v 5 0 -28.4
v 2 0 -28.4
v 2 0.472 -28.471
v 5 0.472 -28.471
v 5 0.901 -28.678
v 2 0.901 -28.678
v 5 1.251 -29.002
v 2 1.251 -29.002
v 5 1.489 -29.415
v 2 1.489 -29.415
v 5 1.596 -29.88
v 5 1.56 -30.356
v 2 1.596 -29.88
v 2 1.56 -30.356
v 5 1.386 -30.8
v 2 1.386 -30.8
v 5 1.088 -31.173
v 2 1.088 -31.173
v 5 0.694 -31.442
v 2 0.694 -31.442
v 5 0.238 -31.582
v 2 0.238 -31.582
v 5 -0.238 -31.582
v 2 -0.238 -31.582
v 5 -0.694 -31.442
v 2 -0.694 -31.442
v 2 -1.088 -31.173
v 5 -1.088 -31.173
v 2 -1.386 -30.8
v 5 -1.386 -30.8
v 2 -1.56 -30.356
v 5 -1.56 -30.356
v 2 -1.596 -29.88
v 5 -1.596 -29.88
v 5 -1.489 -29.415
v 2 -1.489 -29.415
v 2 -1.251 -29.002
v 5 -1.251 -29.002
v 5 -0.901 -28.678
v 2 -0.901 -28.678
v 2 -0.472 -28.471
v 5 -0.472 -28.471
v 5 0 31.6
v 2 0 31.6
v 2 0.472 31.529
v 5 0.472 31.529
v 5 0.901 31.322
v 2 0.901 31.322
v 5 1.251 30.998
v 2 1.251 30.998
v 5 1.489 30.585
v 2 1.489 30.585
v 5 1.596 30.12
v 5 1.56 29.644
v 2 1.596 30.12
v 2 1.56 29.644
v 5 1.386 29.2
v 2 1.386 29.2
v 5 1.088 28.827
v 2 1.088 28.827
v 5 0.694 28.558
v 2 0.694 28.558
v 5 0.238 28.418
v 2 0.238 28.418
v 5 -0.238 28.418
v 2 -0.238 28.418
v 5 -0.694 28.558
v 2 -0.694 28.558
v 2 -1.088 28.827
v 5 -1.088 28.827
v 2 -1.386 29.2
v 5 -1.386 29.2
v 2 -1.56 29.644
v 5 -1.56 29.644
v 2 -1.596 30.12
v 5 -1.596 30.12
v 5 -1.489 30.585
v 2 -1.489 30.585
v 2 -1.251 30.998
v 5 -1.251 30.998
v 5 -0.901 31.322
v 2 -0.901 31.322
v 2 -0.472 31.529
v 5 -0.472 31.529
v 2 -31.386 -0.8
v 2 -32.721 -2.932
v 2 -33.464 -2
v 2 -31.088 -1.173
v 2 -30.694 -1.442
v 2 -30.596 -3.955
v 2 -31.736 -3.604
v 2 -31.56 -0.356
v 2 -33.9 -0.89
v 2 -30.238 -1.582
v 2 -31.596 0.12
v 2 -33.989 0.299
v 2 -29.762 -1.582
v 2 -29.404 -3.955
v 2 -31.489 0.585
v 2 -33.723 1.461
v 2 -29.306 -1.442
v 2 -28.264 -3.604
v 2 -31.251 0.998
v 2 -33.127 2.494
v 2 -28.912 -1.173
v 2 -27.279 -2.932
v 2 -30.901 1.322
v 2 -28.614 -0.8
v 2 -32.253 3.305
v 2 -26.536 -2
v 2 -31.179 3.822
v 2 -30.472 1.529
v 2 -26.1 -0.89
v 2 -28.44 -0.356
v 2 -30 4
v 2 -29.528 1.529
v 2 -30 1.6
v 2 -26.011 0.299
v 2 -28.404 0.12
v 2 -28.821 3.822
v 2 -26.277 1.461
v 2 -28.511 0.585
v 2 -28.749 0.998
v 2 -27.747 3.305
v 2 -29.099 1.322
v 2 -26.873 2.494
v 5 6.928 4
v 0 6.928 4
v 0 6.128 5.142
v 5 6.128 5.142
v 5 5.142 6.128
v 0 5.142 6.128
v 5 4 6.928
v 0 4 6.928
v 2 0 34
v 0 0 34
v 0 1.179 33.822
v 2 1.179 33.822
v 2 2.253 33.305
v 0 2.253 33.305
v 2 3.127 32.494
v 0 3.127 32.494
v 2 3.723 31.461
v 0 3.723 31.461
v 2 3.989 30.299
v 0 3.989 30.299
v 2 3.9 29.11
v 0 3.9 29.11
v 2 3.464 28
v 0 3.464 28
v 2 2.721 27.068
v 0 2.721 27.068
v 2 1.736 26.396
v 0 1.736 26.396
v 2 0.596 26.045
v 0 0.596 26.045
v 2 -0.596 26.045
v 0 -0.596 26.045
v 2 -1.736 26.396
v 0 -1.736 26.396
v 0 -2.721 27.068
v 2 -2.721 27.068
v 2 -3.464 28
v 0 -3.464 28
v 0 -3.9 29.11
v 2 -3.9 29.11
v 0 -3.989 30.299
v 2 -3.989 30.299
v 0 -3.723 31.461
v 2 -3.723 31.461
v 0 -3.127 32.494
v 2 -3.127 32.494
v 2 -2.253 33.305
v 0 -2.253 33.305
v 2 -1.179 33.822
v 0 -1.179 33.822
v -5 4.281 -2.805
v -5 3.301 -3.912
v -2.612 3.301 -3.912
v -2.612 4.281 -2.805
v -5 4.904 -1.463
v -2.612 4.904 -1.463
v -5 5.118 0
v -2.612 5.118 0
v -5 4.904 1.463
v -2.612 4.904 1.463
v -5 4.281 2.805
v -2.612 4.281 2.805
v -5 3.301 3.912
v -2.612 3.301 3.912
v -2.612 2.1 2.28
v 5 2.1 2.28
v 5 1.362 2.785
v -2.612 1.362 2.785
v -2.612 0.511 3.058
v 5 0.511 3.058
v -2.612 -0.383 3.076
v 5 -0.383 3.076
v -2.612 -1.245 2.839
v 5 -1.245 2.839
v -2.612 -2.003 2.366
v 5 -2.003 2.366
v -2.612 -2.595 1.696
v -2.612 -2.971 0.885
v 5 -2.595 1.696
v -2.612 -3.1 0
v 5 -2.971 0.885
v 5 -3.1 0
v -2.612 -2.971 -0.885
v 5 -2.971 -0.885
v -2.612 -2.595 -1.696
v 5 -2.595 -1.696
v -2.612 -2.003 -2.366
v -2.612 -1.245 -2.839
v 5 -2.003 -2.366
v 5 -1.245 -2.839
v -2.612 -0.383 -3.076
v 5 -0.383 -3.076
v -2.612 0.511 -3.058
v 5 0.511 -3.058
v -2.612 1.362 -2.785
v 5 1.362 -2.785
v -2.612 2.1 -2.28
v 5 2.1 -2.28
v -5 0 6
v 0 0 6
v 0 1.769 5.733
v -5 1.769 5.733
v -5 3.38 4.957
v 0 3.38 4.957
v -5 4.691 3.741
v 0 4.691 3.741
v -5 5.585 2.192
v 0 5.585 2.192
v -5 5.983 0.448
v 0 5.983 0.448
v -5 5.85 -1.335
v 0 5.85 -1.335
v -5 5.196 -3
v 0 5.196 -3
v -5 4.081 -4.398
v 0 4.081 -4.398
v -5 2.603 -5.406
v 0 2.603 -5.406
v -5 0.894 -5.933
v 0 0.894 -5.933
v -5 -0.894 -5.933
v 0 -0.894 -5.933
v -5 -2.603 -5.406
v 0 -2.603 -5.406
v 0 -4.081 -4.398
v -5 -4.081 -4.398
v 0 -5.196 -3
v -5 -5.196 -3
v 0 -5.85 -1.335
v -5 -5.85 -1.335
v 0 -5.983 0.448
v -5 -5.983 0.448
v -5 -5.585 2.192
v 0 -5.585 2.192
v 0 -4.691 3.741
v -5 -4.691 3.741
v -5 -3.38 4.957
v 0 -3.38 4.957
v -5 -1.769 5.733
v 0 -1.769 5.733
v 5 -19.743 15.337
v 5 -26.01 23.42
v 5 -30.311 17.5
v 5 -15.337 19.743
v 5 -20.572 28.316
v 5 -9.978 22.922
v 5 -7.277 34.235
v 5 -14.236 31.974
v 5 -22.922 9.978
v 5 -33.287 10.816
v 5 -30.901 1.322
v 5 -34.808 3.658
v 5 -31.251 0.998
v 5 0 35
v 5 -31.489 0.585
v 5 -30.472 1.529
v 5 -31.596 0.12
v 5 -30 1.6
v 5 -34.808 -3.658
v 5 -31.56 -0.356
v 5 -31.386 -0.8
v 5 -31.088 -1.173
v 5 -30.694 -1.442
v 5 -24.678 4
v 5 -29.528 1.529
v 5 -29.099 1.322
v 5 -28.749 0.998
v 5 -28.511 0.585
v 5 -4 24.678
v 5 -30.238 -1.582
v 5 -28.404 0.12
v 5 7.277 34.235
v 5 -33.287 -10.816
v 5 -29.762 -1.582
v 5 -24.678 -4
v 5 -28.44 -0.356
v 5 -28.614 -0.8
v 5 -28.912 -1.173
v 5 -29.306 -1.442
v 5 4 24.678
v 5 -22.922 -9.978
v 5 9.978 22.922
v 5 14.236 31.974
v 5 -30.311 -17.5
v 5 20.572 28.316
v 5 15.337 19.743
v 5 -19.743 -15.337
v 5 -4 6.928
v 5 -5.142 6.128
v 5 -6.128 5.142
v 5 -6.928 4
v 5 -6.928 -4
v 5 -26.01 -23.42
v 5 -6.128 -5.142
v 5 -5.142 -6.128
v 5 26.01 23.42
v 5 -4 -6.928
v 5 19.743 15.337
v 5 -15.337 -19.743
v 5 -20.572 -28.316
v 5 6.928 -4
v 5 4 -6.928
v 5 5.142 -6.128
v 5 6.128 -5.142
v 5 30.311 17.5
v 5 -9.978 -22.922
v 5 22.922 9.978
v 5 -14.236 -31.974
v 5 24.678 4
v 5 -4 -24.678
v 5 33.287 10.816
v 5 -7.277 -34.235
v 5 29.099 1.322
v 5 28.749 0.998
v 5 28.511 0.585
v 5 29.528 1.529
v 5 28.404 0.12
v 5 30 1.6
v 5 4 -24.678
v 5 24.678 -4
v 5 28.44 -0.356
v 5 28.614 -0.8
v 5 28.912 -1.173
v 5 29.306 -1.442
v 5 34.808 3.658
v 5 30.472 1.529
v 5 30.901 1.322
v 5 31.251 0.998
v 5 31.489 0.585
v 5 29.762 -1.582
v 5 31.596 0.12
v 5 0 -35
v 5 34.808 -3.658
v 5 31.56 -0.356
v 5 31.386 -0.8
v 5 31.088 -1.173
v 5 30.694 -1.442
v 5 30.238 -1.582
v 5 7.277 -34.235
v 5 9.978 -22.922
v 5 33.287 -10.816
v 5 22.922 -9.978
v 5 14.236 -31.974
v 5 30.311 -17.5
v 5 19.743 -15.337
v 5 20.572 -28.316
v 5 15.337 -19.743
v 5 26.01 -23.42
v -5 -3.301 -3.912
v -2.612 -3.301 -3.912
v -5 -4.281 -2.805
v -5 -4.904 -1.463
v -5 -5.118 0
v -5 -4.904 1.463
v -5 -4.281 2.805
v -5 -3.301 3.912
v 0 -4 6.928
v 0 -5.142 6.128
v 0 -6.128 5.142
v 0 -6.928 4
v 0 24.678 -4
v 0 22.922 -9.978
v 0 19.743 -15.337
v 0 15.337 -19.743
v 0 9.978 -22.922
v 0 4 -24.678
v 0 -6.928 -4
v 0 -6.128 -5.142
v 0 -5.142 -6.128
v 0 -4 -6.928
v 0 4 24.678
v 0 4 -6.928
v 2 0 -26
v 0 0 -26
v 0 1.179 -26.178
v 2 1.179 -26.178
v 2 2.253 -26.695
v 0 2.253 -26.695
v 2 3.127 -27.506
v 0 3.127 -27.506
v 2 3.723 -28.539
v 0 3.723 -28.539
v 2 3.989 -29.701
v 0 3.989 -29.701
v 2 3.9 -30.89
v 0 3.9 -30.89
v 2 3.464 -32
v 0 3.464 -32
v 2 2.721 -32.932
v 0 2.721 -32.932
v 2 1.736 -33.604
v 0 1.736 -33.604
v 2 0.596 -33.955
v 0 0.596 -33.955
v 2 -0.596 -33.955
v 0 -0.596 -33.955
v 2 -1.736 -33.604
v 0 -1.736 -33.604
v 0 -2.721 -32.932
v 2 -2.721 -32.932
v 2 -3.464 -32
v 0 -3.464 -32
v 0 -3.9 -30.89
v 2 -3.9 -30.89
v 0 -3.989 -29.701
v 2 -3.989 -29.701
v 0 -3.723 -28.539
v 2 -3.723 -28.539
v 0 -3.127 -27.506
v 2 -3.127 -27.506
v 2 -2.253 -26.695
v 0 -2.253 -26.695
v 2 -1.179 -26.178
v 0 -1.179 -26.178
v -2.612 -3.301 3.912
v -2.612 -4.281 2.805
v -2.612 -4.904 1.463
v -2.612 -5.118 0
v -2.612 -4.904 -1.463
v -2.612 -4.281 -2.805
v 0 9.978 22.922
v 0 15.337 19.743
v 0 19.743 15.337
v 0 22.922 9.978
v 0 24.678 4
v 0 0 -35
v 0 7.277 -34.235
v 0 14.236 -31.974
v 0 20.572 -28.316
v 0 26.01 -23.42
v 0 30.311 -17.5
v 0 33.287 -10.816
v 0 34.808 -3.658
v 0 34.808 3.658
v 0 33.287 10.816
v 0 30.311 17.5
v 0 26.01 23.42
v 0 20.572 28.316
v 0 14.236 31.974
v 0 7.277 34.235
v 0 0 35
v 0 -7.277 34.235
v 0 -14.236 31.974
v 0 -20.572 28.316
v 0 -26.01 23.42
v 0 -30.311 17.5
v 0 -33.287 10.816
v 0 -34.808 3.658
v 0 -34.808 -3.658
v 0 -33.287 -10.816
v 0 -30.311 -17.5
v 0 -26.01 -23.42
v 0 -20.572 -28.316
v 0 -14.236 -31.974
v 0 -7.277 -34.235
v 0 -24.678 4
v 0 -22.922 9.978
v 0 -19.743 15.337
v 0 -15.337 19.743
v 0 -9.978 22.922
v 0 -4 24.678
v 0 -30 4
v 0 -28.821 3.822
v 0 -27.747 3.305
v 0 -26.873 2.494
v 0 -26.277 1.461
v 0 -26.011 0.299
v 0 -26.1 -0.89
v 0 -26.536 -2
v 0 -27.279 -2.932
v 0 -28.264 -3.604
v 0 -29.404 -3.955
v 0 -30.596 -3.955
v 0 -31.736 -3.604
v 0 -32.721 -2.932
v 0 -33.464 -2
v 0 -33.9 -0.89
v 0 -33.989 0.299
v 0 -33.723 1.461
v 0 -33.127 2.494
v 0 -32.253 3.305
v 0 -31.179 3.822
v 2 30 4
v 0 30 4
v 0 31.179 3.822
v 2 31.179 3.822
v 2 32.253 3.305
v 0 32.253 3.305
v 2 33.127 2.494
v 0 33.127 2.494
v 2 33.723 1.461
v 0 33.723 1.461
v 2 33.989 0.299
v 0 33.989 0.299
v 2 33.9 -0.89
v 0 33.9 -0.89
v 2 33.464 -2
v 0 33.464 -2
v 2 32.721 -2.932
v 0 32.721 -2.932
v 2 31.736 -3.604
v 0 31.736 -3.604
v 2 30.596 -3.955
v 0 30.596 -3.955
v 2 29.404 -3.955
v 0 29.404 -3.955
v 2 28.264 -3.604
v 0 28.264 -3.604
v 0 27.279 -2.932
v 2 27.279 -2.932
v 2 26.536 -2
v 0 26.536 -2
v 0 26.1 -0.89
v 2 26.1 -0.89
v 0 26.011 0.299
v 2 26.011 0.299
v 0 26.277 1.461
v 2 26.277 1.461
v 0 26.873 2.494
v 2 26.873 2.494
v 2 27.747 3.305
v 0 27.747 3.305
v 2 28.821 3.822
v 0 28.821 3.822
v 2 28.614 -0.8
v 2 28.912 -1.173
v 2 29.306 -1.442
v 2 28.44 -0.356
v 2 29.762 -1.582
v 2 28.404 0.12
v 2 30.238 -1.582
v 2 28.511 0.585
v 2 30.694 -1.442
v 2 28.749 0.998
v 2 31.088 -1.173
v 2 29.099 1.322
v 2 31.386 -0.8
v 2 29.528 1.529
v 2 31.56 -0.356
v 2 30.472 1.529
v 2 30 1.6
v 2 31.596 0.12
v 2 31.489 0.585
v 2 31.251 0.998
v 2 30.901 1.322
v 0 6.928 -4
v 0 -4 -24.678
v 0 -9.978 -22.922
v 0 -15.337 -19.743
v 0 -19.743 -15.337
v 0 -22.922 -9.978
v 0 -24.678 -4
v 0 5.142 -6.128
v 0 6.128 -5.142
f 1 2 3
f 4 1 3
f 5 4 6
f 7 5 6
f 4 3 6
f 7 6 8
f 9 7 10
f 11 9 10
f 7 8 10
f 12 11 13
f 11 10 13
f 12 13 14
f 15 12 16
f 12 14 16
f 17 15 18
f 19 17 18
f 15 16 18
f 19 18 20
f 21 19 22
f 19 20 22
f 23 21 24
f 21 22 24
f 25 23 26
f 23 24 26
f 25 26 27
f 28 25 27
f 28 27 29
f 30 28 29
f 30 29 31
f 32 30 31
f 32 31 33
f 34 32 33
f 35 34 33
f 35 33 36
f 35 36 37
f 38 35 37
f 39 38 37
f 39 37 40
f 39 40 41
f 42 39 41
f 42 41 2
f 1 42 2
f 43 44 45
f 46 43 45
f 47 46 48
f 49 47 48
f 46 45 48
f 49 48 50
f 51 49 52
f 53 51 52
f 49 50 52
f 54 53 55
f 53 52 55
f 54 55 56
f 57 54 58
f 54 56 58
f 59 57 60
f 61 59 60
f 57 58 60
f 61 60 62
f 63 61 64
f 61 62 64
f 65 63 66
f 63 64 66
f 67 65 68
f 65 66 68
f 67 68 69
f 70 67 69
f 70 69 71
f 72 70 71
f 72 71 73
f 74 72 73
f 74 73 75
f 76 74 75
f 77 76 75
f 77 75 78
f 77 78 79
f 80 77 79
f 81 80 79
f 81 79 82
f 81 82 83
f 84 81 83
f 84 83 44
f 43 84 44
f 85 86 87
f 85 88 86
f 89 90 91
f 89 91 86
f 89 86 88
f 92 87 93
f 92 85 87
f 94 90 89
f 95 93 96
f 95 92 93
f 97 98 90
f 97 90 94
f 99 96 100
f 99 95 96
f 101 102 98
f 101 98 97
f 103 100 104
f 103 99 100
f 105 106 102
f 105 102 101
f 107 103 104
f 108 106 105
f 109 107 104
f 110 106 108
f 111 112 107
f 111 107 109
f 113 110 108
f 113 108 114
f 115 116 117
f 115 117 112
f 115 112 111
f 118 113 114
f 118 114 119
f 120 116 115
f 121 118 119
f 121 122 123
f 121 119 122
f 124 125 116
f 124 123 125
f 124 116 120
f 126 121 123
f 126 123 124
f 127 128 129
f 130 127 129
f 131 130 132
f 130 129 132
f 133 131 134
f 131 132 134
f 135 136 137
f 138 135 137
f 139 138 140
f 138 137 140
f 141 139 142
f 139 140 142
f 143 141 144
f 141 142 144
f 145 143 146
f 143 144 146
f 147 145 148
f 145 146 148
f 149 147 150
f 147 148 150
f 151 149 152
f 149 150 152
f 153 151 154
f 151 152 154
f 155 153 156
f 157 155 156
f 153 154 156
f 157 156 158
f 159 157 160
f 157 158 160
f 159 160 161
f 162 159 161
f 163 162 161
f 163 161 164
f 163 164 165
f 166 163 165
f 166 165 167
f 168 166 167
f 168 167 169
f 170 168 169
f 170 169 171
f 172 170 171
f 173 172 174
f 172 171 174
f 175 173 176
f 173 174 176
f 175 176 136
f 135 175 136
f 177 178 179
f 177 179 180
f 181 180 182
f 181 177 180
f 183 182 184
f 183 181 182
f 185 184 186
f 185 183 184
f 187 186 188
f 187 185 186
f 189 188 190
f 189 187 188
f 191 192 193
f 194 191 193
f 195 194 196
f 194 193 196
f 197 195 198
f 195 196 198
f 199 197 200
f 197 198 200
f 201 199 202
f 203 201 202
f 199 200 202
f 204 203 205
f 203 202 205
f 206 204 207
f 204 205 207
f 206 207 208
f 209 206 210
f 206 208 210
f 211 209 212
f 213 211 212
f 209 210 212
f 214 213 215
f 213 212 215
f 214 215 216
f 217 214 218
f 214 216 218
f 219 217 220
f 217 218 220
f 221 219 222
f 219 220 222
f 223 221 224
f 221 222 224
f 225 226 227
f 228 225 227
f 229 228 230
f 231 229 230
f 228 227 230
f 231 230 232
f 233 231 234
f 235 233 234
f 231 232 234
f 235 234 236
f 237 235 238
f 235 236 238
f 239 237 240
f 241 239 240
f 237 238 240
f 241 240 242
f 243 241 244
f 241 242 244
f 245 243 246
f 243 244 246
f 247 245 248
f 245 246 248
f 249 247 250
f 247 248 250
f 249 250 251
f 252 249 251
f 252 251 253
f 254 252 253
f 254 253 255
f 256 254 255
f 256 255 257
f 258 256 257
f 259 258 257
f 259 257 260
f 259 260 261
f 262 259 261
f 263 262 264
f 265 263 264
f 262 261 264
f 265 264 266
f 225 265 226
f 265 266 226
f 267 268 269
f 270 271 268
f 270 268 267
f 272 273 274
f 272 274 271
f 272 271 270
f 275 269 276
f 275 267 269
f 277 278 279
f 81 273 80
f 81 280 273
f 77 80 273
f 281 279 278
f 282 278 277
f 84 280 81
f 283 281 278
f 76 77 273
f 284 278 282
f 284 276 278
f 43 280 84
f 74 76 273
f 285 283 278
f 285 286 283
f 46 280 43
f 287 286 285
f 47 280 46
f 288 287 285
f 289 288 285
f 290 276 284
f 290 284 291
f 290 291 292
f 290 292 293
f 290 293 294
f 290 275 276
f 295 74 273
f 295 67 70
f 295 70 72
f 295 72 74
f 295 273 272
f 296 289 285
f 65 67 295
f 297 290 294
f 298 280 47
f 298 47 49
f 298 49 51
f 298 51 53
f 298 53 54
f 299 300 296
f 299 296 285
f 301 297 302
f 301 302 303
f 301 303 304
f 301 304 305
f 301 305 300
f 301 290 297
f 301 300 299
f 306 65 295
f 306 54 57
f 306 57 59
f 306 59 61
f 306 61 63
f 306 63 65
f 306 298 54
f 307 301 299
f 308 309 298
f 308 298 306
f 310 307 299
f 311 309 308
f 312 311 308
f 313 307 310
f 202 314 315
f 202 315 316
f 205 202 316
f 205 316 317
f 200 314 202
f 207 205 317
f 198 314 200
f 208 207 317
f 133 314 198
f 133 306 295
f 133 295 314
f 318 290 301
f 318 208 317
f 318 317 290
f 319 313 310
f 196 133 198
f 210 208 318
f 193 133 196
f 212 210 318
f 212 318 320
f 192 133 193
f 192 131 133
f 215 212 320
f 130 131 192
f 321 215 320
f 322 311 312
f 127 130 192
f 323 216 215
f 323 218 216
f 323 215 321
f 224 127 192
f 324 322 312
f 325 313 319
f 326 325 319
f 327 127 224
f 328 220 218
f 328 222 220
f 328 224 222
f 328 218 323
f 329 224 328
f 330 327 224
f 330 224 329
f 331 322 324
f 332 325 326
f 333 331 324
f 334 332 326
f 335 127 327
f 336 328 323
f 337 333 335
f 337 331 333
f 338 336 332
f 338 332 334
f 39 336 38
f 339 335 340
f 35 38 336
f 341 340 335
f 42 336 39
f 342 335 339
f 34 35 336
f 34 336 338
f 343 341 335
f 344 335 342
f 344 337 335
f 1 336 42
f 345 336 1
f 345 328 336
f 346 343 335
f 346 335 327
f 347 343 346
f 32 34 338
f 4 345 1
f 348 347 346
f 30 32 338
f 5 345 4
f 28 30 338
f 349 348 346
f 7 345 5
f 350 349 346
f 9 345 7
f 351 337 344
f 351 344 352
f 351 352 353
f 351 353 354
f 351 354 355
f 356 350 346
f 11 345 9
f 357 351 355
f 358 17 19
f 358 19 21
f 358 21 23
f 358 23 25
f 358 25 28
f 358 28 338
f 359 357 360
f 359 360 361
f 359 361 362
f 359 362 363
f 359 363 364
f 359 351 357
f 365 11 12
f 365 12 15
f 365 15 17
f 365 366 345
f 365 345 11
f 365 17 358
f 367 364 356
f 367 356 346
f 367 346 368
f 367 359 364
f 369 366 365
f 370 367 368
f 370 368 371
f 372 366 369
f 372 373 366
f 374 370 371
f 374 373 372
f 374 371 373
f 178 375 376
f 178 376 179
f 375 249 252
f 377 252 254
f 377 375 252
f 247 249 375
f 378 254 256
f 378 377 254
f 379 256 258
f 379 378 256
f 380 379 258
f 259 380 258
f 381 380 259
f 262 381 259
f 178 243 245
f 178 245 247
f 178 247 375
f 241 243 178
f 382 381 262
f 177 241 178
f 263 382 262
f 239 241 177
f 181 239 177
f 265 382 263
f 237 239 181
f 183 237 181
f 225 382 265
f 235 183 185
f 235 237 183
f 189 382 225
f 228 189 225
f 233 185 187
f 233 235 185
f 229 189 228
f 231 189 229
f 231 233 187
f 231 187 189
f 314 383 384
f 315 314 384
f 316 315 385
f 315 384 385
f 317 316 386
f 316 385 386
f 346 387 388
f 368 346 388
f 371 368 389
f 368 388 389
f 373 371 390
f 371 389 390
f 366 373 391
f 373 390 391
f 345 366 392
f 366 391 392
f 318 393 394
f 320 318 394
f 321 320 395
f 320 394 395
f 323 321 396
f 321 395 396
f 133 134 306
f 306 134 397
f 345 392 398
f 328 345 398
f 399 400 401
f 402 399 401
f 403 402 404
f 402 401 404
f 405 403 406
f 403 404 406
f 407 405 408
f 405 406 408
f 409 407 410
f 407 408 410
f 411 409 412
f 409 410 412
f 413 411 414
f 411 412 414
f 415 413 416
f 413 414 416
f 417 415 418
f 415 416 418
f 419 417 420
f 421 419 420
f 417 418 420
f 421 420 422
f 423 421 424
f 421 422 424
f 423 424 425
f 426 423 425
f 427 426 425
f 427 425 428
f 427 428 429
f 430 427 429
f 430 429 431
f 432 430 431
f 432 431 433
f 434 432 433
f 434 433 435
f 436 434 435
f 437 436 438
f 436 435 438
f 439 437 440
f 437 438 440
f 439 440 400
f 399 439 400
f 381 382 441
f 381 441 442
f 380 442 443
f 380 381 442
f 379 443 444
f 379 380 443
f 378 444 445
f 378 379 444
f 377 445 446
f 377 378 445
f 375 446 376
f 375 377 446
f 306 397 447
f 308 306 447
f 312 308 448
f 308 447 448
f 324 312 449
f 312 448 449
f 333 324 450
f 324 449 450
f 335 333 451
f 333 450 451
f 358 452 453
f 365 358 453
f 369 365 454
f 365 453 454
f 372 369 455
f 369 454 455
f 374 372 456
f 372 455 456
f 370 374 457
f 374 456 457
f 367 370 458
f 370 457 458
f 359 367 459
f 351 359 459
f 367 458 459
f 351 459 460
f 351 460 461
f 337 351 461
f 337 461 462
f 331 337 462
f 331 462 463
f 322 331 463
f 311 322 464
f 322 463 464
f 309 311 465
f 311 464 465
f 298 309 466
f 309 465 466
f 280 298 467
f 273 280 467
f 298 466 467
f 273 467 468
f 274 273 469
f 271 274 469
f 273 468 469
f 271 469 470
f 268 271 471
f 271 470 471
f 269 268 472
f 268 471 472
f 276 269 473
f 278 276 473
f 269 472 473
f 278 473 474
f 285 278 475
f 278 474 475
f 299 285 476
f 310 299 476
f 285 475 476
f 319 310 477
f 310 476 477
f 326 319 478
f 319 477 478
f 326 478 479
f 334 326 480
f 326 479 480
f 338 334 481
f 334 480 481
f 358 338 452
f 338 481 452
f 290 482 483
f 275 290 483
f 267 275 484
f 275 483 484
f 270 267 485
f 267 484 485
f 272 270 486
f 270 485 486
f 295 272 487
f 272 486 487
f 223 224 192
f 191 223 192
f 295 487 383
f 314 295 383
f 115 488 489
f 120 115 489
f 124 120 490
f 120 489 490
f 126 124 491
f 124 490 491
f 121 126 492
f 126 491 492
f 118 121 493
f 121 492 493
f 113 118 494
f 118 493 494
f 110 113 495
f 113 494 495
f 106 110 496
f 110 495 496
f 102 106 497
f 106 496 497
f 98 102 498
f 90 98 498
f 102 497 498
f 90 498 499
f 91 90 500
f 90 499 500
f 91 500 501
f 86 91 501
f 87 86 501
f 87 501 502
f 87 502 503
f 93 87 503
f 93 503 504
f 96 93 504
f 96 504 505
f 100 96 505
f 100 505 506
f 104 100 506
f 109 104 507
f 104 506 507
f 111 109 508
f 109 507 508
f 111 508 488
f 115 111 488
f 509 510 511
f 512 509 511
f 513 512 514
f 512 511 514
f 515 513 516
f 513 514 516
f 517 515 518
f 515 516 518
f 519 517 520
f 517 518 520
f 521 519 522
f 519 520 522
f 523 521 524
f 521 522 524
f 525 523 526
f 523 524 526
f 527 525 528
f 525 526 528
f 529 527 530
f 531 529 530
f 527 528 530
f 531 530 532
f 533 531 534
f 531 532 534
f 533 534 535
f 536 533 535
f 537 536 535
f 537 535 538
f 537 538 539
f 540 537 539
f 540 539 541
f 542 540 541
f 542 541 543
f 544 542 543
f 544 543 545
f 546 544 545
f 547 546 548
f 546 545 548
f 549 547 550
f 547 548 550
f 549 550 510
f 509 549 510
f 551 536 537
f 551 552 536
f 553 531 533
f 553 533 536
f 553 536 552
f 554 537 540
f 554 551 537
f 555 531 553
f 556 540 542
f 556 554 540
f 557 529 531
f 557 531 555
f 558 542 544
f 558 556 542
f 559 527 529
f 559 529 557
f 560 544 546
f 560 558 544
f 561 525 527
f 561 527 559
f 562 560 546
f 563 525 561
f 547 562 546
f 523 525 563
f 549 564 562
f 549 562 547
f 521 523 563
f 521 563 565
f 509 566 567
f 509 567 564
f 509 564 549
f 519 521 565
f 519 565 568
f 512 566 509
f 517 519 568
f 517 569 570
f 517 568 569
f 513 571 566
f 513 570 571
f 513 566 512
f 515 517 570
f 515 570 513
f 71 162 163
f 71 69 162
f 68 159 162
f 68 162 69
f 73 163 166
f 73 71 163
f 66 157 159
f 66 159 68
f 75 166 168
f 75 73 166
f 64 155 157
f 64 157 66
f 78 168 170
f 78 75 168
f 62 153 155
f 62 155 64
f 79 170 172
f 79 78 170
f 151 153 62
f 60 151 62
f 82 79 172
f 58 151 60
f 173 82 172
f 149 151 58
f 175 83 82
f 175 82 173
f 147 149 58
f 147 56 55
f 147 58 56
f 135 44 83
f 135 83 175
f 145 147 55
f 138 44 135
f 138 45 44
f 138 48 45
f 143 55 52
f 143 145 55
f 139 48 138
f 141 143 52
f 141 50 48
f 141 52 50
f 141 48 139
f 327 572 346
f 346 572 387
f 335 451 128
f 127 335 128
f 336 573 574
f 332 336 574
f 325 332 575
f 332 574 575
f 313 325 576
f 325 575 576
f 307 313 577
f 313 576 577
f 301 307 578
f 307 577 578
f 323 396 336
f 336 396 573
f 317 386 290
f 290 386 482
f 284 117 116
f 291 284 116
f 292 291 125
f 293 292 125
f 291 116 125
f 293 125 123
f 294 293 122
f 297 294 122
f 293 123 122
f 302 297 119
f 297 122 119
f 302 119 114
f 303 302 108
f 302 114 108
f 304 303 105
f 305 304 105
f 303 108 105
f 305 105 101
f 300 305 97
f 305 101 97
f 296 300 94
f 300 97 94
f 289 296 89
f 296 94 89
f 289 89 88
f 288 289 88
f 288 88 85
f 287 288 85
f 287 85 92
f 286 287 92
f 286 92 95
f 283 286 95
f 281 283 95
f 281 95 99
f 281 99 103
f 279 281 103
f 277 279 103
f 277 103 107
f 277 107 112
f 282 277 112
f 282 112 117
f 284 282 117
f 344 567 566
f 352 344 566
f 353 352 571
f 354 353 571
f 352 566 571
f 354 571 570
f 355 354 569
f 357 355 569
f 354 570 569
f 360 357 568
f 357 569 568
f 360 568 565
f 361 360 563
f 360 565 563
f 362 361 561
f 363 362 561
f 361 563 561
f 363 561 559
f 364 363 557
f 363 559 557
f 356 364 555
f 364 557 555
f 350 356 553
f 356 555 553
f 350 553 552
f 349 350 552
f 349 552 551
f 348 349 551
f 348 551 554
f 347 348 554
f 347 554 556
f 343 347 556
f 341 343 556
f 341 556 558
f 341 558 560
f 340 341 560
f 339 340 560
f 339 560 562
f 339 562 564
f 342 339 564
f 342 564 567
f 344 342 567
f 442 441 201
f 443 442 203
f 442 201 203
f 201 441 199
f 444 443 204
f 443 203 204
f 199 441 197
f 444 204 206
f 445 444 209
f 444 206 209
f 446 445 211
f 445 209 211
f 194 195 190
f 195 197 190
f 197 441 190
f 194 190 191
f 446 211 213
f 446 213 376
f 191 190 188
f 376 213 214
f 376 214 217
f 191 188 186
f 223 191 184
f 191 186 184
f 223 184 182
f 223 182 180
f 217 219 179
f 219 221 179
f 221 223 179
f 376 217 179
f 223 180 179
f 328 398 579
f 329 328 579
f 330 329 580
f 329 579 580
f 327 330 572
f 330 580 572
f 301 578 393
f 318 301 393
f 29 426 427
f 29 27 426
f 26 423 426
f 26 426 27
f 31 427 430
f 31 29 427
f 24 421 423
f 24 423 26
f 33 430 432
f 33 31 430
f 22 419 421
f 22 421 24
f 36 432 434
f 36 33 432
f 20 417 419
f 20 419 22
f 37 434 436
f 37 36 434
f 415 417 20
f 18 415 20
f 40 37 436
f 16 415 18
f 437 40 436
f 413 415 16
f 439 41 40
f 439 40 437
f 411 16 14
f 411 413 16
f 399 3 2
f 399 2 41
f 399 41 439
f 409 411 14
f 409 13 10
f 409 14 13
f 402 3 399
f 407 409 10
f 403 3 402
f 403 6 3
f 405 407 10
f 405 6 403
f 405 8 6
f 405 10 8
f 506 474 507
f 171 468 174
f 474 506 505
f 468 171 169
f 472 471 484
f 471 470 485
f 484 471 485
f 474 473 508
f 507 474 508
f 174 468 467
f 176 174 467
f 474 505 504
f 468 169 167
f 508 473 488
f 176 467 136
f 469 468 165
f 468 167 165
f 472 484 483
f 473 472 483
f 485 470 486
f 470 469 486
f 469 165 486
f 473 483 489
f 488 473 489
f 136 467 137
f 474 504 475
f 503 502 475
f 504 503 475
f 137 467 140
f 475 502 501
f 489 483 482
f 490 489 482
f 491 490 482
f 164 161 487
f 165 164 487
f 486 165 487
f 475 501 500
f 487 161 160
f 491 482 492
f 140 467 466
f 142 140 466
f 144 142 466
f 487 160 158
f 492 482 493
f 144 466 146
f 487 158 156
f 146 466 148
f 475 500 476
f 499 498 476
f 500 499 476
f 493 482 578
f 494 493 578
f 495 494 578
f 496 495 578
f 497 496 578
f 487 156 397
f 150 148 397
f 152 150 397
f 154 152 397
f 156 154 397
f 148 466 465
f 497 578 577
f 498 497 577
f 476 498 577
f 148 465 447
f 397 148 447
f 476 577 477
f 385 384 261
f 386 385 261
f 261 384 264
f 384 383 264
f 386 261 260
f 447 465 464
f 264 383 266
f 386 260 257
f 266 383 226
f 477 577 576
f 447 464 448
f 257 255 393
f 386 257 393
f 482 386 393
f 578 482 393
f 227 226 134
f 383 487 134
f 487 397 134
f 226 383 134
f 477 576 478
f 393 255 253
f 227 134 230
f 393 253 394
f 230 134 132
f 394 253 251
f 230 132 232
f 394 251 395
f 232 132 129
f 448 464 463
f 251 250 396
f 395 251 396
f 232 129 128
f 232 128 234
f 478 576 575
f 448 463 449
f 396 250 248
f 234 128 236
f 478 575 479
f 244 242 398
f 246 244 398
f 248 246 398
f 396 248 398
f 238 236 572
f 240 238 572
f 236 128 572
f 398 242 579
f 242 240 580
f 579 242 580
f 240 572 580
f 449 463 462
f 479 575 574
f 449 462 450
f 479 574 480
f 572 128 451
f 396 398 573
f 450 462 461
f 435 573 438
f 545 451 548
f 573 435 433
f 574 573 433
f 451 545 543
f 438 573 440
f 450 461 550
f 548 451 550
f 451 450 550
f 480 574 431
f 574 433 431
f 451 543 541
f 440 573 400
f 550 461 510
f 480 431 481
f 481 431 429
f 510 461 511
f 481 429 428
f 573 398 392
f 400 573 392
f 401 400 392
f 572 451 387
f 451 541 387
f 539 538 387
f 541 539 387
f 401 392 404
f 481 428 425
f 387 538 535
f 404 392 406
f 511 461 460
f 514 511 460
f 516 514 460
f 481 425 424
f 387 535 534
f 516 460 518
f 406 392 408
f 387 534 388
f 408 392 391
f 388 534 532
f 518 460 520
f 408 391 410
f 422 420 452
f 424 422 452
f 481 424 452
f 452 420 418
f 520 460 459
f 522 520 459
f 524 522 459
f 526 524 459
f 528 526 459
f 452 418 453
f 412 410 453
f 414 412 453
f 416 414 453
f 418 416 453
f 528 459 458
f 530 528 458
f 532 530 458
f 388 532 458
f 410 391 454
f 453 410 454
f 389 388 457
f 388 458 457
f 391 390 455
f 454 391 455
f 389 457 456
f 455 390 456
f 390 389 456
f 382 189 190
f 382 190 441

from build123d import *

# Parameters (mm, degrees)
SKETCH1_R           = 35
BOSS_EXTRUDE1_DEPTH = 5
SKETCH2_R           = 1.6
CUT_EXTRUDE1_DEPTH  = 6
SKETCH3_R           = 6
BOSS_EXTRUDE2_DEPTH = 5
SKETCH6_R           = 4
CUT_EXTRUDE2_DEPTH  = 2
CUT_EXTRUDE3_DEPTH  = 2.3876


with BuildPart() as part:
    # Sketch1 → Boss-Extrude1 (new body)
    with BuildSketch(Plane(origin=(0, 0, 0), x_dir=(0, 0, -1), z_dir=(1, 0, 0))):
        Circle(SKETCH1_R)
        with BuildLine():
            Line((4, 6.92820323), (4, 24.677925359))
            ThreePointArc((4, 24.677925359), (17.67766953, 17.67766953), (24.677925359, 4))
            Line((24.677925359, 4), (6.92820323, 4))
            ThreePointArc((6.92820323, 4), (5.656854249, 5.656854249), (4, 6.92820323))
        make_face(mode=Mode.SUBTRACT)
        with BuildLine():
            Line((-4, 24.677925359), (-4, 6.92820323))
            ThreePointArc((-4, 6.92820323), (-5.656854249, 5.656854249), (-6.92820323, 4))
            Line((-6.92820323, 4), (-24.677925359, 4))
            ThreePointArc((-24.677925359, 4), (-17.67766953, 17.67766953), (-4, 24.677925359))
        make_face(mode=Mode.SUBTRACT)
        with BuildLine():
            Line((-24.677925359, -4), (-6.92820323, -4))
            ThreePointArc((-6.92820323, -4), (-5.656854249, -5.656854249), (-4, -6.92820323))
            Line((-4, -6.92820323), (-4, -24.677925359))
            ThreePointArc((-4, -24.677925359), (-17.67766953, -17.67766953), (-24.677925359, -4))
        make_face(mode=Mode.SUBTRACT)
        with BuildLine():
            Line((4, -24.677925359), (4, -6.92820323))
            ThreePointArc((4, -6.92820323), (5.656854249, -5.656854249), (6.92820323, -4))
            Line((6.92820323, -4), (24.677925359, -4))
            ThreePointArc((24.677925359, -4), (17.67766953, -17.67766953), (4, -24.677925359))
        make_face(mode=Mode.SUBTRACT)
        with BuildLine():
            Line((2.28035085, 2.1), (-2.28035085, 2.1))
            ThreePointArc((-2.28035085, 2.1), (0, -3.1), (2.28035085, 2.1))
        make_face(mode=Mode.SUBTRACT)
    extrude(amount=BOSS_EXTRUDE1_DEPTH)

    # Sketch2 → Cut-Extrude1 (cut, through all)
    with BuildSketch(Plane.ZY):
        with Locations((0, 30)):
            Circle(SKETCH2_R)
        with Locations((30, 0)):
            Circle(SKETCH2_R)
        with Locations((0, -30)):
            Circle(SKETCH2_R)
        with Locations((-30, 0)):
            Circle(SKETCH2_R)
    extrude(amount=-CUT_EXTRUDE1_DEPTH, mode=Mode.SUBTRACT)

    # Sketch3 → Boss-Extrude2 (add)
    with BuildSketch(Plane.ZY):
        Circle(SKETCH3_R)
        with BuildLine():
            Line((-2.28035085, 2.1), (2.28035085, 2.1))
            ThreePointArc((2.28035085, 2.1), (0, -3.1), (-2.28035085, 2.1))
        make_face(mode=Mode.SUBTRACT)
    extrude(amount=BOSS_EXTRUDE2_DEPTH)

    # Sketch6 → Cut-Extrude2 (cut)
    with BuildSketch(Plane.ZY):
        with Locations((0, 30)):
            Circle(SKETCH6_R)
        with Locations((30, 0)):
            Circle(SKETCH6_R)
        with Locations((0, -30)):
            Circle(SKETCH6_R)
        with Locations((-30, 0)):
            Circle(SKETCH6_R)
    extrude(amount=-CUT_EXTRUDE2_DEPTH, mode=Mode.SUBTRACT)

    # Sketch7 → Cut-Extrude3 (cut)
    with BuildSketch(Plane.ZY.offset(5)):
        with BuildLine():
            Line((-3.9116, -3.300656457), (-3.9116, 3.300656457))
            ThreePointArc((-3.9116, 3.300656457), (0, 5.1181), (3.9116, 3.300656457))
            Line((3.9116, 3.300656457), (3.9116, -3.300656457))
            ThreePointArc((3.9116, -3.300656457), (0, -5.1181), (-3.9116, -3.300656457))
        make_face()
    extrude(amount=-CUT_EXTRUDE3_DEPTH, mode=Mode.SUBTRACT)


solid = part.part
